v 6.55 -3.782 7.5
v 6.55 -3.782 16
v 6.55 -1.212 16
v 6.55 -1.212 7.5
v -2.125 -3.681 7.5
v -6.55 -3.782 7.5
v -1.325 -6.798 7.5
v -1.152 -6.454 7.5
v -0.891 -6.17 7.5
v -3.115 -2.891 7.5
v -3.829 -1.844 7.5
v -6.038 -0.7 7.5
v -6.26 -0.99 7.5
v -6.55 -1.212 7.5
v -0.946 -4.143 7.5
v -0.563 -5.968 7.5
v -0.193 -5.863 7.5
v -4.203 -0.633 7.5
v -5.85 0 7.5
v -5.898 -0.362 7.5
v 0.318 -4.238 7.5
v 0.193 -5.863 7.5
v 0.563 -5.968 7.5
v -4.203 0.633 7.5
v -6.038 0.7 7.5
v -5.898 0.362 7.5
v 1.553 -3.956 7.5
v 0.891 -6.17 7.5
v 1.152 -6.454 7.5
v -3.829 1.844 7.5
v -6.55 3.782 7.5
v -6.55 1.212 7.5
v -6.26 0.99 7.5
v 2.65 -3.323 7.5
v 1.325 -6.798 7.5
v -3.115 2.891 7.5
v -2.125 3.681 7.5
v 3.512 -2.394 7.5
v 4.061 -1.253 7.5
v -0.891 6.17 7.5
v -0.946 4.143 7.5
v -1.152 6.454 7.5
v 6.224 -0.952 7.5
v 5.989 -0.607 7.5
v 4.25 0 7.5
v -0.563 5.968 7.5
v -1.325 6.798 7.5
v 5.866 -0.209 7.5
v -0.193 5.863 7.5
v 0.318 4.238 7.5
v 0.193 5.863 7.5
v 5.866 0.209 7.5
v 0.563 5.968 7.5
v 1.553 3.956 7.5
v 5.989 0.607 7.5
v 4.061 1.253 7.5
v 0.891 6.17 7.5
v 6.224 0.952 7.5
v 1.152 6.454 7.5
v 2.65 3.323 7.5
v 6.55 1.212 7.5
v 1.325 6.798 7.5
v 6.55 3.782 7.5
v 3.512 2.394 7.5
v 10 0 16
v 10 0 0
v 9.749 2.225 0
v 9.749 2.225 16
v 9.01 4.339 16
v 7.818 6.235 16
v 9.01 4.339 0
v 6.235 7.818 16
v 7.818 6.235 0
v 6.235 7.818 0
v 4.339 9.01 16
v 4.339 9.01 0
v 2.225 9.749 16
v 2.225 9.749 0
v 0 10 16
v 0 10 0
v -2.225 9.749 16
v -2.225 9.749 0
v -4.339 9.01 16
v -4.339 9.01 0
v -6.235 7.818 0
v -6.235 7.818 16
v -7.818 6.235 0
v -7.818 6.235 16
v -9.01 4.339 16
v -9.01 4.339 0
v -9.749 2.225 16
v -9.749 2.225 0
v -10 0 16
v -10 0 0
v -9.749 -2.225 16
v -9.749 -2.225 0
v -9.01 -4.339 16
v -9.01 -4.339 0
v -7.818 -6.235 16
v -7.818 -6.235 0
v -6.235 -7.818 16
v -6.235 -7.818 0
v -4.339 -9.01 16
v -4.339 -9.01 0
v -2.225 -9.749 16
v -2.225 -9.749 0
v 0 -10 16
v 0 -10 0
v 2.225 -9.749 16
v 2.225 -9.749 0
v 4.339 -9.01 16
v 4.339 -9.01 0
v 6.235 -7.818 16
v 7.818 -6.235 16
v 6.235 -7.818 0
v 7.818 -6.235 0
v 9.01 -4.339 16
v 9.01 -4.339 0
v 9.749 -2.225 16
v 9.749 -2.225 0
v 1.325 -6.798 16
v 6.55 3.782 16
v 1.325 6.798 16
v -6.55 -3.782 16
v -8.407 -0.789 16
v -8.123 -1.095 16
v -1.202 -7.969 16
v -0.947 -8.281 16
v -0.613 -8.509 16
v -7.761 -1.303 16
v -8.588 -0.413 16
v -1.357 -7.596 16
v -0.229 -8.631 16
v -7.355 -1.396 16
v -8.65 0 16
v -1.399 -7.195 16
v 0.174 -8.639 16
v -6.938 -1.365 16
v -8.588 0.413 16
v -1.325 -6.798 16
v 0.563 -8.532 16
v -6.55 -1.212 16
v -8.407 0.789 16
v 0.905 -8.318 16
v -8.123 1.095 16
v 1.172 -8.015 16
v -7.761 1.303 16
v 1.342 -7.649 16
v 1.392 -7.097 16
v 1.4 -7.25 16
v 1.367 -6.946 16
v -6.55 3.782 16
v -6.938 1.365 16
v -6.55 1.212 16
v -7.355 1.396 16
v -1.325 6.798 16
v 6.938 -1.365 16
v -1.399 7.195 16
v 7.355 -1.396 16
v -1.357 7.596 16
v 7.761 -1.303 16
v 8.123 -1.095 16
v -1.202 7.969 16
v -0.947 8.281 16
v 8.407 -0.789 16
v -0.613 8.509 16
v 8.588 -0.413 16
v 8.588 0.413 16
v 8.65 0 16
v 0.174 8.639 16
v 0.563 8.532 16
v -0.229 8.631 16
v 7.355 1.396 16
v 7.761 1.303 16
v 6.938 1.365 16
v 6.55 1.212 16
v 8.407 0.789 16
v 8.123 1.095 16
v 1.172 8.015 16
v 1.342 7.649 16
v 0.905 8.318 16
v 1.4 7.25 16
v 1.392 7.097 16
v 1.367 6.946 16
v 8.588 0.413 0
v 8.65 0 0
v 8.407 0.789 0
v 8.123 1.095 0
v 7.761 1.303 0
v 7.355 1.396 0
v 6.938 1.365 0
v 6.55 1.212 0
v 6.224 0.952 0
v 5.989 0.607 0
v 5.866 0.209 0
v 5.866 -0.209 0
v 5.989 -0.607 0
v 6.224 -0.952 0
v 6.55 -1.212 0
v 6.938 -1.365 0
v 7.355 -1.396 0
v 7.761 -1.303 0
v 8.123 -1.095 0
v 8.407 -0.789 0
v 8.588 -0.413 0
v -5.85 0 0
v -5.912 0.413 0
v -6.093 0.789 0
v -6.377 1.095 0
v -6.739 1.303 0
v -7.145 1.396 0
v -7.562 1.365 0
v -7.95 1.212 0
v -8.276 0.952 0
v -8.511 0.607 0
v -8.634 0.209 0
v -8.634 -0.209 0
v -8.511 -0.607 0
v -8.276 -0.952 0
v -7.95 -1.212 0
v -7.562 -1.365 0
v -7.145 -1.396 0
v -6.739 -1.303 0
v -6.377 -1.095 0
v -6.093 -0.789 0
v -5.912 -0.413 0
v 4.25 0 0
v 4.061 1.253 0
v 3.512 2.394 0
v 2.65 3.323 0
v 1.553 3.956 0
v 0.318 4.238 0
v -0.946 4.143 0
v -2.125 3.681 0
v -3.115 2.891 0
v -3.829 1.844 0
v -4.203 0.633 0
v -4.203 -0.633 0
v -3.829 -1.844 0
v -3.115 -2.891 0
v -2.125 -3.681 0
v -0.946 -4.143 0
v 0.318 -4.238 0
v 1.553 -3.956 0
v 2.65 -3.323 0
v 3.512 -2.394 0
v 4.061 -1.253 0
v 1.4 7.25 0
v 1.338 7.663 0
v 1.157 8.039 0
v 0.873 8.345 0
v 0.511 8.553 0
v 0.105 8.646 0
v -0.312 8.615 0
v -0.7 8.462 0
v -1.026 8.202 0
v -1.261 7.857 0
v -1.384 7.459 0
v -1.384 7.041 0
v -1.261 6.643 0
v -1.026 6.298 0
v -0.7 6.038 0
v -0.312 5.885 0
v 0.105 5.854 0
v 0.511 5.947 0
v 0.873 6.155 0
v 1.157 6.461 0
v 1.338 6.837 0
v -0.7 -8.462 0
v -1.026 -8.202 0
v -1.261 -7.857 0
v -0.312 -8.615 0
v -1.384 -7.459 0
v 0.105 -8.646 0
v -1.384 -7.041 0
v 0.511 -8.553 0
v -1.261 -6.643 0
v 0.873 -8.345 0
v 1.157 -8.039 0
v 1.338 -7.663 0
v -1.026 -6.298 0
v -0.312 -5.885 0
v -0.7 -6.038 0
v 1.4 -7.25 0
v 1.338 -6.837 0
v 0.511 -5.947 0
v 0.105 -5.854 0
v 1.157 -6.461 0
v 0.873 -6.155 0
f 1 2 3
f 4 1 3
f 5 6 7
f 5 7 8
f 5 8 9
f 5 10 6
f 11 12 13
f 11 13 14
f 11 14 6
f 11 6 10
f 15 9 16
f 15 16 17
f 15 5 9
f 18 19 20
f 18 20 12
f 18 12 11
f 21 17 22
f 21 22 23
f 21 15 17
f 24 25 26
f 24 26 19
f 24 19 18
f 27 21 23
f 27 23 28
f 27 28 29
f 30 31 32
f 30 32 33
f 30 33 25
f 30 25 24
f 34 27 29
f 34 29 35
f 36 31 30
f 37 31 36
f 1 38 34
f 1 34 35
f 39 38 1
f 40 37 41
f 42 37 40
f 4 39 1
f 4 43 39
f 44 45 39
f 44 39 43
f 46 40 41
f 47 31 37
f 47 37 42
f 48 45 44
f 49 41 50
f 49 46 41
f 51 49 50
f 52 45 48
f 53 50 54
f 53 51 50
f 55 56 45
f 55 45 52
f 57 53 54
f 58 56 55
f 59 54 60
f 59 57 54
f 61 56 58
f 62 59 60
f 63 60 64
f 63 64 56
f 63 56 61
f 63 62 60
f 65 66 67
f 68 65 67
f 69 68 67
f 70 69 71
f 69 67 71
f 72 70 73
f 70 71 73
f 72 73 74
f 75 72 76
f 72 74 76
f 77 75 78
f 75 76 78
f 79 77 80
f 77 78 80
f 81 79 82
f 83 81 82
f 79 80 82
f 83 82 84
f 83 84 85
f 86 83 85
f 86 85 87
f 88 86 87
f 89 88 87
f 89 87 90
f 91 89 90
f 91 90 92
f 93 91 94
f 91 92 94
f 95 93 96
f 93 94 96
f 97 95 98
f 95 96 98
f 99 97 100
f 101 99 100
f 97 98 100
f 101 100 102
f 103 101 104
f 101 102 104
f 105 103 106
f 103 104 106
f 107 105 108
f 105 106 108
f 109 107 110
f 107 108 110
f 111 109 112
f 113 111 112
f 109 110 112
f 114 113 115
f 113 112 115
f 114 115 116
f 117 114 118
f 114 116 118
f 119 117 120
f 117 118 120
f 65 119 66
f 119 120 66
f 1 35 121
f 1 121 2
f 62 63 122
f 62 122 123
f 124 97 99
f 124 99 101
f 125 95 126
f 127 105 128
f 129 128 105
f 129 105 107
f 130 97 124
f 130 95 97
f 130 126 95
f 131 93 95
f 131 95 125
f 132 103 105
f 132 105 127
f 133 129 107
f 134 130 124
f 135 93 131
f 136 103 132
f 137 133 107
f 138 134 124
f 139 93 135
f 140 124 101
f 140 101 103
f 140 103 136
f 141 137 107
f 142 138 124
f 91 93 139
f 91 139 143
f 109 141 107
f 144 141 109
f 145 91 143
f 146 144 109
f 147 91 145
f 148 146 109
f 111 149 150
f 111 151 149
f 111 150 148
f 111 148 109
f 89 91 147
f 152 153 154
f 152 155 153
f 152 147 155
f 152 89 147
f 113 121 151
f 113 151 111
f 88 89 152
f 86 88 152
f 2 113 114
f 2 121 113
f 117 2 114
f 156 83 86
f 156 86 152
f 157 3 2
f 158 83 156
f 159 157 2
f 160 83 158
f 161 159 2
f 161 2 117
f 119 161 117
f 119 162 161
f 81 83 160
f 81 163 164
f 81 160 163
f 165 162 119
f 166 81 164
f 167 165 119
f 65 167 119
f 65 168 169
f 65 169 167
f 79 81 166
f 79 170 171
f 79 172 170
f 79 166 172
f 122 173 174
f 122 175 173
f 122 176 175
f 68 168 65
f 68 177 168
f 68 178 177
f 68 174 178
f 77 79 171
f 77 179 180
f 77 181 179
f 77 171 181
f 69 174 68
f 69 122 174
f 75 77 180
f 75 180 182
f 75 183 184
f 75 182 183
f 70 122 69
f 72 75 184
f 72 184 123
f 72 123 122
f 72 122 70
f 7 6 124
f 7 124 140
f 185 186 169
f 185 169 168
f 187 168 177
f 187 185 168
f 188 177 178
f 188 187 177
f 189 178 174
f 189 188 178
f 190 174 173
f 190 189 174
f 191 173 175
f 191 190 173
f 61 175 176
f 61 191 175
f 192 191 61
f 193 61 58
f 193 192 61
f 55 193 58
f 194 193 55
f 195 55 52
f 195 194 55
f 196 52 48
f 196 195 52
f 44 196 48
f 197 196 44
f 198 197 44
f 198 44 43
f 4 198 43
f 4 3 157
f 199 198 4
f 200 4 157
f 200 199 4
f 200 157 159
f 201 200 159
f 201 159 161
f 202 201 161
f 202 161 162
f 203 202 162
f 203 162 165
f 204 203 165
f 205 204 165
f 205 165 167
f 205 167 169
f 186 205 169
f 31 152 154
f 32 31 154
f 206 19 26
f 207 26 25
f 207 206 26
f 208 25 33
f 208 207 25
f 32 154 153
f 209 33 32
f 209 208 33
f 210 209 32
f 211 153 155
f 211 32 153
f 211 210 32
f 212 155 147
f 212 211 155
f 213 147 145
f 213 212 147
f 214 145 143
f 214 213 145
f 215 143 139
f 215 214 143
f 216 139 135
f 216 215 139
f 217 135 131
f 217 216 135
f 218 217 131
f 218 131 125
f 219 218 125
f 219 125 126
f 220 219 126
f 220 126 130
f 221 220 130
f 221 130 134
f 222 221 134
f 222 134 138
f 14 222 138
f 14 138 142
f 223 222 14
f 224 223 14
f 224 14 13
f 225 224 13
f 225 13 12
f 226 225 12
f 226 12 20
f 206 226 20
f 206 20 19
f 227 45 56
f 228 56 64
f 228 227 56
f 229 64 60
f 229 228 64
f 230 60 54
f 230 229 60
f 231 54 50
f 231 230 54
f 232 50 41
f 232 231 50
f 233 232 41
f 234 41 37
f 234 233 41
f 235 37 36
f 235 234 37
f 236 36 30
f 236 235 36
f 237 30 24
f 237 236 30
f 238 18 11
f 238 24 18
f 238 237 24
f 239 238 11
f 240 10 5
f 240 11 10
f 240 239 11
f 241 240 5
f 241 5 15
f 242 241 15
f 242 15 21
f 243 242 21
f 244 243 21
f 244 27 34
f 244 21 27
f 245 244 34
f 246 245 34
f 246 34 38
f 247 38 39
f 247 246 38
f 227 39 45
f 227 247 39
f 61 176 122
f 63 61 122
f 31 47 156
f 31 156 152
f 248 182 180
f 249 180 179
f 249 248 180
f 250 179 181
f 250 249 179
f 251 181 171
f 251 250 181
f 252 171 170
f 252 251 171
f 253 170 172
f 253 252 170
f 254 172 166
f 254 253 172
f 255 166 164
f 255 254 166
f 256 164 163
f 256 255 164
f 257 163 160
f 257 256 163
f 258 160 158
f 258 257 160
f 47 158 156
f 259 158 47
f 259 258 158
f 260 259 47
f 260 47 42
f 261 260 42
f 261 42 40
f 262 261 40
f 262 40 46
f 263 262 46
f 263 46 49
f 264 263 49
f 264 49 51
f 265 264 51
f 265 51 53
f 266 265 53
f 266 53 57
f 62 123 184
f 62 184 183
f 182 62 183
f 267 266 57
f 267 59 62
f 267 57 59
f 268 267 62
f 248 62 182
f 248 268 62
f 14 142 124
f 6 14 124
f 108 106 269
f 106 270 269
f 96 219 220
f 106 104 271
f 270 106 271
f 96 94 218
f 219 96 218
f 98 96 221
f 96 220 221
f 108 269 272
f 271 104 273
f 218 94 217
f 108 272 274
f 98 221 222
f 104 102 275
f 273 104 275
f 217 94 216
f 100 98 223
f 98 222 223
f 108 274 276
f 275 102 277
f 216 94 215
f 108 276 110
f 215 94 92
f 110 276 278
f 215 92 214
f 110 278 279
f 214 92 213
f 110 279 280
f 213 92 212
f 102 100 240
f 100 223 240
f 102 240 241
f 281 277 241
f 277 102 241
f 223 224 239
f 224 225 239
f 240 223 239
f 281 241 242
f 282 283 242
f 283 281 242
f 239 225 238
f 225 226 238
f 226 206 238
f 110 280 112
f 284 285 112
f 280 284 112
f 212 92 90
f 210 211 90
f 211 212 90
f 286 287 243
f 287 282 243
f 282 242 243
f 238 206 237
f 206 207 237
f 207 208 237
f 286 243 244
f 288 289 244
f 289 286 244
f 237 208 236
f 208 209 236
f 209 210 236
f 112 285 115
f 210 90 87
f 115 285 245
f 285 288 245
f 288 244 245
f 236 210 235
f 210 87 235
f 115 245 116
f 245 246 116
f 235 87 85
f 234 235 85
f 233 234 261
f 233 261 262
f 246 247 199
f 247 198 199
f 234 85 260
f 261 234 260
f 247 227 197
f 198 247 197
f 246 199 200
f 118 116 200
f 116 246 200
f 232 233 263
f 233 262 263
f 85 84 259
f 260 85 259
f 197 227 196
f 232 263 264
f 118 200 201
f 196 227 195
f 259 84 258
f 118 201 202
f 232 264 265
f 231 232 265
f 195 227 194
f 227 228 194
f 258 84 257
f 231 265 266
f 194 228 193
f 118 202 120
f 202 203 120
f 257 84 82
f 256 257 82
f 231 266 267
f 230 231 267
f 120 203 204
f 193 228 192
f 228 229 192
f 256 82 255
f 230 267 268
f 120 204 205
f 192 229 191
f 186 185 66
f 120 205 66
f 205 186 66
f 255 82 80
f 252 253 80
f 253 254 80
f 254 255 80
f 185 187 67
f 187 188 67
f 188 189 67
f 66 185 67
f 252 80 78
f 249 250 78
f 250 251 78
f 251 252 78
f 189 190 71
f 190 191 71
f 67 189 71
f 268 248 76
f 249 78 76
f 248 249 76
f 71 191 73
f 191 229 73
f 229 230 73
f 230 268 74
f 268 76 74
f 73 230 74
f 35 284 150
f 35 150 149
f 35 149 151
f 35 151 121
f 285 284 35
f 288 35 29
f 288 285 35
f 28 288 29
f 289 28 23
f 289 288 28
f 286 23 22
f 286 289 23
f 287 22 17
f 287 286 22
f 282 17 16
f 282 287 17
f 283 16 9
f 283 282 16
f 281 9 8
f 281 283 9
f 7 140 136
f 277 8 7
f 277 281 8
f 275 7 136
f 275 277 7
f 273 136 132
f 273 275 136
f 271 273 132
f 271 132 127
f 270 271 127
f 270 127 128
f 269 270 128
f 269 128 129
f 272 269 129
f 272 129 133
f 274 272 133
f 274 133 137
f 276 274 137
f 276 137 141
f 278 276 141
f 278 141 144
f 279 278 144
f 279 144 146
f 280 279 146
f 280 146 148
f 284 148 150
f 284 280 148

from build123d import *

# Parameters (mm, degrees)
SKETCH1_R           = 10
SKETCH1_R_2         = 1.4
SKETCH1_R_3         = 4.25
BOSS_EXTRUDE1_DEPTH = 16
CUT_EXTRUDE1_DEPTH  = 8.5


with BuildPart() as part:
    # Sketch1 → Boss-Extrude1 (new body)
    with BuildSketch(Plane.XY):
        Circle(SKETCH1_R)
        with Locations((0, 7.25)):
            Circle(SKETCH1_R_2, mode=Mode.SUBTRACT)
        Circle(SKETCH1_R_3, mode=Mode.SUBTRACT)
        with Locations((7.25, 0)):
            Circle(SKETCH1_R_2, mode=Mode.SUBTRACT)
        with Locations((0, -7.25)):
            Circle(SKETCH1_R_2, mode=Mode.SUBTRACT)
        with Locations((-7.25, 0)):
            Circle(SKETCH1_R_2, mode=Mode.SUBTRACT)
    extrude(amount=BOSS_EXTRUDE1_DEPTH)

    # Sketch2 → Cut-Extrude1 (cut)
    with BuildSketch(Plane.XY.offset(16)):
        Polygon((0, 7.563288526), (-6.55, 3.781644263), (-6.55, -3.781644263), (0, -7.563288526), (6.55, -3.781644263), (6.55, 3.781644263), align=None)
    extrude(amount=-CUT_EXTRUDE1_DEPTH, mode=Mode.SUBTRACT)


solid = part.part
